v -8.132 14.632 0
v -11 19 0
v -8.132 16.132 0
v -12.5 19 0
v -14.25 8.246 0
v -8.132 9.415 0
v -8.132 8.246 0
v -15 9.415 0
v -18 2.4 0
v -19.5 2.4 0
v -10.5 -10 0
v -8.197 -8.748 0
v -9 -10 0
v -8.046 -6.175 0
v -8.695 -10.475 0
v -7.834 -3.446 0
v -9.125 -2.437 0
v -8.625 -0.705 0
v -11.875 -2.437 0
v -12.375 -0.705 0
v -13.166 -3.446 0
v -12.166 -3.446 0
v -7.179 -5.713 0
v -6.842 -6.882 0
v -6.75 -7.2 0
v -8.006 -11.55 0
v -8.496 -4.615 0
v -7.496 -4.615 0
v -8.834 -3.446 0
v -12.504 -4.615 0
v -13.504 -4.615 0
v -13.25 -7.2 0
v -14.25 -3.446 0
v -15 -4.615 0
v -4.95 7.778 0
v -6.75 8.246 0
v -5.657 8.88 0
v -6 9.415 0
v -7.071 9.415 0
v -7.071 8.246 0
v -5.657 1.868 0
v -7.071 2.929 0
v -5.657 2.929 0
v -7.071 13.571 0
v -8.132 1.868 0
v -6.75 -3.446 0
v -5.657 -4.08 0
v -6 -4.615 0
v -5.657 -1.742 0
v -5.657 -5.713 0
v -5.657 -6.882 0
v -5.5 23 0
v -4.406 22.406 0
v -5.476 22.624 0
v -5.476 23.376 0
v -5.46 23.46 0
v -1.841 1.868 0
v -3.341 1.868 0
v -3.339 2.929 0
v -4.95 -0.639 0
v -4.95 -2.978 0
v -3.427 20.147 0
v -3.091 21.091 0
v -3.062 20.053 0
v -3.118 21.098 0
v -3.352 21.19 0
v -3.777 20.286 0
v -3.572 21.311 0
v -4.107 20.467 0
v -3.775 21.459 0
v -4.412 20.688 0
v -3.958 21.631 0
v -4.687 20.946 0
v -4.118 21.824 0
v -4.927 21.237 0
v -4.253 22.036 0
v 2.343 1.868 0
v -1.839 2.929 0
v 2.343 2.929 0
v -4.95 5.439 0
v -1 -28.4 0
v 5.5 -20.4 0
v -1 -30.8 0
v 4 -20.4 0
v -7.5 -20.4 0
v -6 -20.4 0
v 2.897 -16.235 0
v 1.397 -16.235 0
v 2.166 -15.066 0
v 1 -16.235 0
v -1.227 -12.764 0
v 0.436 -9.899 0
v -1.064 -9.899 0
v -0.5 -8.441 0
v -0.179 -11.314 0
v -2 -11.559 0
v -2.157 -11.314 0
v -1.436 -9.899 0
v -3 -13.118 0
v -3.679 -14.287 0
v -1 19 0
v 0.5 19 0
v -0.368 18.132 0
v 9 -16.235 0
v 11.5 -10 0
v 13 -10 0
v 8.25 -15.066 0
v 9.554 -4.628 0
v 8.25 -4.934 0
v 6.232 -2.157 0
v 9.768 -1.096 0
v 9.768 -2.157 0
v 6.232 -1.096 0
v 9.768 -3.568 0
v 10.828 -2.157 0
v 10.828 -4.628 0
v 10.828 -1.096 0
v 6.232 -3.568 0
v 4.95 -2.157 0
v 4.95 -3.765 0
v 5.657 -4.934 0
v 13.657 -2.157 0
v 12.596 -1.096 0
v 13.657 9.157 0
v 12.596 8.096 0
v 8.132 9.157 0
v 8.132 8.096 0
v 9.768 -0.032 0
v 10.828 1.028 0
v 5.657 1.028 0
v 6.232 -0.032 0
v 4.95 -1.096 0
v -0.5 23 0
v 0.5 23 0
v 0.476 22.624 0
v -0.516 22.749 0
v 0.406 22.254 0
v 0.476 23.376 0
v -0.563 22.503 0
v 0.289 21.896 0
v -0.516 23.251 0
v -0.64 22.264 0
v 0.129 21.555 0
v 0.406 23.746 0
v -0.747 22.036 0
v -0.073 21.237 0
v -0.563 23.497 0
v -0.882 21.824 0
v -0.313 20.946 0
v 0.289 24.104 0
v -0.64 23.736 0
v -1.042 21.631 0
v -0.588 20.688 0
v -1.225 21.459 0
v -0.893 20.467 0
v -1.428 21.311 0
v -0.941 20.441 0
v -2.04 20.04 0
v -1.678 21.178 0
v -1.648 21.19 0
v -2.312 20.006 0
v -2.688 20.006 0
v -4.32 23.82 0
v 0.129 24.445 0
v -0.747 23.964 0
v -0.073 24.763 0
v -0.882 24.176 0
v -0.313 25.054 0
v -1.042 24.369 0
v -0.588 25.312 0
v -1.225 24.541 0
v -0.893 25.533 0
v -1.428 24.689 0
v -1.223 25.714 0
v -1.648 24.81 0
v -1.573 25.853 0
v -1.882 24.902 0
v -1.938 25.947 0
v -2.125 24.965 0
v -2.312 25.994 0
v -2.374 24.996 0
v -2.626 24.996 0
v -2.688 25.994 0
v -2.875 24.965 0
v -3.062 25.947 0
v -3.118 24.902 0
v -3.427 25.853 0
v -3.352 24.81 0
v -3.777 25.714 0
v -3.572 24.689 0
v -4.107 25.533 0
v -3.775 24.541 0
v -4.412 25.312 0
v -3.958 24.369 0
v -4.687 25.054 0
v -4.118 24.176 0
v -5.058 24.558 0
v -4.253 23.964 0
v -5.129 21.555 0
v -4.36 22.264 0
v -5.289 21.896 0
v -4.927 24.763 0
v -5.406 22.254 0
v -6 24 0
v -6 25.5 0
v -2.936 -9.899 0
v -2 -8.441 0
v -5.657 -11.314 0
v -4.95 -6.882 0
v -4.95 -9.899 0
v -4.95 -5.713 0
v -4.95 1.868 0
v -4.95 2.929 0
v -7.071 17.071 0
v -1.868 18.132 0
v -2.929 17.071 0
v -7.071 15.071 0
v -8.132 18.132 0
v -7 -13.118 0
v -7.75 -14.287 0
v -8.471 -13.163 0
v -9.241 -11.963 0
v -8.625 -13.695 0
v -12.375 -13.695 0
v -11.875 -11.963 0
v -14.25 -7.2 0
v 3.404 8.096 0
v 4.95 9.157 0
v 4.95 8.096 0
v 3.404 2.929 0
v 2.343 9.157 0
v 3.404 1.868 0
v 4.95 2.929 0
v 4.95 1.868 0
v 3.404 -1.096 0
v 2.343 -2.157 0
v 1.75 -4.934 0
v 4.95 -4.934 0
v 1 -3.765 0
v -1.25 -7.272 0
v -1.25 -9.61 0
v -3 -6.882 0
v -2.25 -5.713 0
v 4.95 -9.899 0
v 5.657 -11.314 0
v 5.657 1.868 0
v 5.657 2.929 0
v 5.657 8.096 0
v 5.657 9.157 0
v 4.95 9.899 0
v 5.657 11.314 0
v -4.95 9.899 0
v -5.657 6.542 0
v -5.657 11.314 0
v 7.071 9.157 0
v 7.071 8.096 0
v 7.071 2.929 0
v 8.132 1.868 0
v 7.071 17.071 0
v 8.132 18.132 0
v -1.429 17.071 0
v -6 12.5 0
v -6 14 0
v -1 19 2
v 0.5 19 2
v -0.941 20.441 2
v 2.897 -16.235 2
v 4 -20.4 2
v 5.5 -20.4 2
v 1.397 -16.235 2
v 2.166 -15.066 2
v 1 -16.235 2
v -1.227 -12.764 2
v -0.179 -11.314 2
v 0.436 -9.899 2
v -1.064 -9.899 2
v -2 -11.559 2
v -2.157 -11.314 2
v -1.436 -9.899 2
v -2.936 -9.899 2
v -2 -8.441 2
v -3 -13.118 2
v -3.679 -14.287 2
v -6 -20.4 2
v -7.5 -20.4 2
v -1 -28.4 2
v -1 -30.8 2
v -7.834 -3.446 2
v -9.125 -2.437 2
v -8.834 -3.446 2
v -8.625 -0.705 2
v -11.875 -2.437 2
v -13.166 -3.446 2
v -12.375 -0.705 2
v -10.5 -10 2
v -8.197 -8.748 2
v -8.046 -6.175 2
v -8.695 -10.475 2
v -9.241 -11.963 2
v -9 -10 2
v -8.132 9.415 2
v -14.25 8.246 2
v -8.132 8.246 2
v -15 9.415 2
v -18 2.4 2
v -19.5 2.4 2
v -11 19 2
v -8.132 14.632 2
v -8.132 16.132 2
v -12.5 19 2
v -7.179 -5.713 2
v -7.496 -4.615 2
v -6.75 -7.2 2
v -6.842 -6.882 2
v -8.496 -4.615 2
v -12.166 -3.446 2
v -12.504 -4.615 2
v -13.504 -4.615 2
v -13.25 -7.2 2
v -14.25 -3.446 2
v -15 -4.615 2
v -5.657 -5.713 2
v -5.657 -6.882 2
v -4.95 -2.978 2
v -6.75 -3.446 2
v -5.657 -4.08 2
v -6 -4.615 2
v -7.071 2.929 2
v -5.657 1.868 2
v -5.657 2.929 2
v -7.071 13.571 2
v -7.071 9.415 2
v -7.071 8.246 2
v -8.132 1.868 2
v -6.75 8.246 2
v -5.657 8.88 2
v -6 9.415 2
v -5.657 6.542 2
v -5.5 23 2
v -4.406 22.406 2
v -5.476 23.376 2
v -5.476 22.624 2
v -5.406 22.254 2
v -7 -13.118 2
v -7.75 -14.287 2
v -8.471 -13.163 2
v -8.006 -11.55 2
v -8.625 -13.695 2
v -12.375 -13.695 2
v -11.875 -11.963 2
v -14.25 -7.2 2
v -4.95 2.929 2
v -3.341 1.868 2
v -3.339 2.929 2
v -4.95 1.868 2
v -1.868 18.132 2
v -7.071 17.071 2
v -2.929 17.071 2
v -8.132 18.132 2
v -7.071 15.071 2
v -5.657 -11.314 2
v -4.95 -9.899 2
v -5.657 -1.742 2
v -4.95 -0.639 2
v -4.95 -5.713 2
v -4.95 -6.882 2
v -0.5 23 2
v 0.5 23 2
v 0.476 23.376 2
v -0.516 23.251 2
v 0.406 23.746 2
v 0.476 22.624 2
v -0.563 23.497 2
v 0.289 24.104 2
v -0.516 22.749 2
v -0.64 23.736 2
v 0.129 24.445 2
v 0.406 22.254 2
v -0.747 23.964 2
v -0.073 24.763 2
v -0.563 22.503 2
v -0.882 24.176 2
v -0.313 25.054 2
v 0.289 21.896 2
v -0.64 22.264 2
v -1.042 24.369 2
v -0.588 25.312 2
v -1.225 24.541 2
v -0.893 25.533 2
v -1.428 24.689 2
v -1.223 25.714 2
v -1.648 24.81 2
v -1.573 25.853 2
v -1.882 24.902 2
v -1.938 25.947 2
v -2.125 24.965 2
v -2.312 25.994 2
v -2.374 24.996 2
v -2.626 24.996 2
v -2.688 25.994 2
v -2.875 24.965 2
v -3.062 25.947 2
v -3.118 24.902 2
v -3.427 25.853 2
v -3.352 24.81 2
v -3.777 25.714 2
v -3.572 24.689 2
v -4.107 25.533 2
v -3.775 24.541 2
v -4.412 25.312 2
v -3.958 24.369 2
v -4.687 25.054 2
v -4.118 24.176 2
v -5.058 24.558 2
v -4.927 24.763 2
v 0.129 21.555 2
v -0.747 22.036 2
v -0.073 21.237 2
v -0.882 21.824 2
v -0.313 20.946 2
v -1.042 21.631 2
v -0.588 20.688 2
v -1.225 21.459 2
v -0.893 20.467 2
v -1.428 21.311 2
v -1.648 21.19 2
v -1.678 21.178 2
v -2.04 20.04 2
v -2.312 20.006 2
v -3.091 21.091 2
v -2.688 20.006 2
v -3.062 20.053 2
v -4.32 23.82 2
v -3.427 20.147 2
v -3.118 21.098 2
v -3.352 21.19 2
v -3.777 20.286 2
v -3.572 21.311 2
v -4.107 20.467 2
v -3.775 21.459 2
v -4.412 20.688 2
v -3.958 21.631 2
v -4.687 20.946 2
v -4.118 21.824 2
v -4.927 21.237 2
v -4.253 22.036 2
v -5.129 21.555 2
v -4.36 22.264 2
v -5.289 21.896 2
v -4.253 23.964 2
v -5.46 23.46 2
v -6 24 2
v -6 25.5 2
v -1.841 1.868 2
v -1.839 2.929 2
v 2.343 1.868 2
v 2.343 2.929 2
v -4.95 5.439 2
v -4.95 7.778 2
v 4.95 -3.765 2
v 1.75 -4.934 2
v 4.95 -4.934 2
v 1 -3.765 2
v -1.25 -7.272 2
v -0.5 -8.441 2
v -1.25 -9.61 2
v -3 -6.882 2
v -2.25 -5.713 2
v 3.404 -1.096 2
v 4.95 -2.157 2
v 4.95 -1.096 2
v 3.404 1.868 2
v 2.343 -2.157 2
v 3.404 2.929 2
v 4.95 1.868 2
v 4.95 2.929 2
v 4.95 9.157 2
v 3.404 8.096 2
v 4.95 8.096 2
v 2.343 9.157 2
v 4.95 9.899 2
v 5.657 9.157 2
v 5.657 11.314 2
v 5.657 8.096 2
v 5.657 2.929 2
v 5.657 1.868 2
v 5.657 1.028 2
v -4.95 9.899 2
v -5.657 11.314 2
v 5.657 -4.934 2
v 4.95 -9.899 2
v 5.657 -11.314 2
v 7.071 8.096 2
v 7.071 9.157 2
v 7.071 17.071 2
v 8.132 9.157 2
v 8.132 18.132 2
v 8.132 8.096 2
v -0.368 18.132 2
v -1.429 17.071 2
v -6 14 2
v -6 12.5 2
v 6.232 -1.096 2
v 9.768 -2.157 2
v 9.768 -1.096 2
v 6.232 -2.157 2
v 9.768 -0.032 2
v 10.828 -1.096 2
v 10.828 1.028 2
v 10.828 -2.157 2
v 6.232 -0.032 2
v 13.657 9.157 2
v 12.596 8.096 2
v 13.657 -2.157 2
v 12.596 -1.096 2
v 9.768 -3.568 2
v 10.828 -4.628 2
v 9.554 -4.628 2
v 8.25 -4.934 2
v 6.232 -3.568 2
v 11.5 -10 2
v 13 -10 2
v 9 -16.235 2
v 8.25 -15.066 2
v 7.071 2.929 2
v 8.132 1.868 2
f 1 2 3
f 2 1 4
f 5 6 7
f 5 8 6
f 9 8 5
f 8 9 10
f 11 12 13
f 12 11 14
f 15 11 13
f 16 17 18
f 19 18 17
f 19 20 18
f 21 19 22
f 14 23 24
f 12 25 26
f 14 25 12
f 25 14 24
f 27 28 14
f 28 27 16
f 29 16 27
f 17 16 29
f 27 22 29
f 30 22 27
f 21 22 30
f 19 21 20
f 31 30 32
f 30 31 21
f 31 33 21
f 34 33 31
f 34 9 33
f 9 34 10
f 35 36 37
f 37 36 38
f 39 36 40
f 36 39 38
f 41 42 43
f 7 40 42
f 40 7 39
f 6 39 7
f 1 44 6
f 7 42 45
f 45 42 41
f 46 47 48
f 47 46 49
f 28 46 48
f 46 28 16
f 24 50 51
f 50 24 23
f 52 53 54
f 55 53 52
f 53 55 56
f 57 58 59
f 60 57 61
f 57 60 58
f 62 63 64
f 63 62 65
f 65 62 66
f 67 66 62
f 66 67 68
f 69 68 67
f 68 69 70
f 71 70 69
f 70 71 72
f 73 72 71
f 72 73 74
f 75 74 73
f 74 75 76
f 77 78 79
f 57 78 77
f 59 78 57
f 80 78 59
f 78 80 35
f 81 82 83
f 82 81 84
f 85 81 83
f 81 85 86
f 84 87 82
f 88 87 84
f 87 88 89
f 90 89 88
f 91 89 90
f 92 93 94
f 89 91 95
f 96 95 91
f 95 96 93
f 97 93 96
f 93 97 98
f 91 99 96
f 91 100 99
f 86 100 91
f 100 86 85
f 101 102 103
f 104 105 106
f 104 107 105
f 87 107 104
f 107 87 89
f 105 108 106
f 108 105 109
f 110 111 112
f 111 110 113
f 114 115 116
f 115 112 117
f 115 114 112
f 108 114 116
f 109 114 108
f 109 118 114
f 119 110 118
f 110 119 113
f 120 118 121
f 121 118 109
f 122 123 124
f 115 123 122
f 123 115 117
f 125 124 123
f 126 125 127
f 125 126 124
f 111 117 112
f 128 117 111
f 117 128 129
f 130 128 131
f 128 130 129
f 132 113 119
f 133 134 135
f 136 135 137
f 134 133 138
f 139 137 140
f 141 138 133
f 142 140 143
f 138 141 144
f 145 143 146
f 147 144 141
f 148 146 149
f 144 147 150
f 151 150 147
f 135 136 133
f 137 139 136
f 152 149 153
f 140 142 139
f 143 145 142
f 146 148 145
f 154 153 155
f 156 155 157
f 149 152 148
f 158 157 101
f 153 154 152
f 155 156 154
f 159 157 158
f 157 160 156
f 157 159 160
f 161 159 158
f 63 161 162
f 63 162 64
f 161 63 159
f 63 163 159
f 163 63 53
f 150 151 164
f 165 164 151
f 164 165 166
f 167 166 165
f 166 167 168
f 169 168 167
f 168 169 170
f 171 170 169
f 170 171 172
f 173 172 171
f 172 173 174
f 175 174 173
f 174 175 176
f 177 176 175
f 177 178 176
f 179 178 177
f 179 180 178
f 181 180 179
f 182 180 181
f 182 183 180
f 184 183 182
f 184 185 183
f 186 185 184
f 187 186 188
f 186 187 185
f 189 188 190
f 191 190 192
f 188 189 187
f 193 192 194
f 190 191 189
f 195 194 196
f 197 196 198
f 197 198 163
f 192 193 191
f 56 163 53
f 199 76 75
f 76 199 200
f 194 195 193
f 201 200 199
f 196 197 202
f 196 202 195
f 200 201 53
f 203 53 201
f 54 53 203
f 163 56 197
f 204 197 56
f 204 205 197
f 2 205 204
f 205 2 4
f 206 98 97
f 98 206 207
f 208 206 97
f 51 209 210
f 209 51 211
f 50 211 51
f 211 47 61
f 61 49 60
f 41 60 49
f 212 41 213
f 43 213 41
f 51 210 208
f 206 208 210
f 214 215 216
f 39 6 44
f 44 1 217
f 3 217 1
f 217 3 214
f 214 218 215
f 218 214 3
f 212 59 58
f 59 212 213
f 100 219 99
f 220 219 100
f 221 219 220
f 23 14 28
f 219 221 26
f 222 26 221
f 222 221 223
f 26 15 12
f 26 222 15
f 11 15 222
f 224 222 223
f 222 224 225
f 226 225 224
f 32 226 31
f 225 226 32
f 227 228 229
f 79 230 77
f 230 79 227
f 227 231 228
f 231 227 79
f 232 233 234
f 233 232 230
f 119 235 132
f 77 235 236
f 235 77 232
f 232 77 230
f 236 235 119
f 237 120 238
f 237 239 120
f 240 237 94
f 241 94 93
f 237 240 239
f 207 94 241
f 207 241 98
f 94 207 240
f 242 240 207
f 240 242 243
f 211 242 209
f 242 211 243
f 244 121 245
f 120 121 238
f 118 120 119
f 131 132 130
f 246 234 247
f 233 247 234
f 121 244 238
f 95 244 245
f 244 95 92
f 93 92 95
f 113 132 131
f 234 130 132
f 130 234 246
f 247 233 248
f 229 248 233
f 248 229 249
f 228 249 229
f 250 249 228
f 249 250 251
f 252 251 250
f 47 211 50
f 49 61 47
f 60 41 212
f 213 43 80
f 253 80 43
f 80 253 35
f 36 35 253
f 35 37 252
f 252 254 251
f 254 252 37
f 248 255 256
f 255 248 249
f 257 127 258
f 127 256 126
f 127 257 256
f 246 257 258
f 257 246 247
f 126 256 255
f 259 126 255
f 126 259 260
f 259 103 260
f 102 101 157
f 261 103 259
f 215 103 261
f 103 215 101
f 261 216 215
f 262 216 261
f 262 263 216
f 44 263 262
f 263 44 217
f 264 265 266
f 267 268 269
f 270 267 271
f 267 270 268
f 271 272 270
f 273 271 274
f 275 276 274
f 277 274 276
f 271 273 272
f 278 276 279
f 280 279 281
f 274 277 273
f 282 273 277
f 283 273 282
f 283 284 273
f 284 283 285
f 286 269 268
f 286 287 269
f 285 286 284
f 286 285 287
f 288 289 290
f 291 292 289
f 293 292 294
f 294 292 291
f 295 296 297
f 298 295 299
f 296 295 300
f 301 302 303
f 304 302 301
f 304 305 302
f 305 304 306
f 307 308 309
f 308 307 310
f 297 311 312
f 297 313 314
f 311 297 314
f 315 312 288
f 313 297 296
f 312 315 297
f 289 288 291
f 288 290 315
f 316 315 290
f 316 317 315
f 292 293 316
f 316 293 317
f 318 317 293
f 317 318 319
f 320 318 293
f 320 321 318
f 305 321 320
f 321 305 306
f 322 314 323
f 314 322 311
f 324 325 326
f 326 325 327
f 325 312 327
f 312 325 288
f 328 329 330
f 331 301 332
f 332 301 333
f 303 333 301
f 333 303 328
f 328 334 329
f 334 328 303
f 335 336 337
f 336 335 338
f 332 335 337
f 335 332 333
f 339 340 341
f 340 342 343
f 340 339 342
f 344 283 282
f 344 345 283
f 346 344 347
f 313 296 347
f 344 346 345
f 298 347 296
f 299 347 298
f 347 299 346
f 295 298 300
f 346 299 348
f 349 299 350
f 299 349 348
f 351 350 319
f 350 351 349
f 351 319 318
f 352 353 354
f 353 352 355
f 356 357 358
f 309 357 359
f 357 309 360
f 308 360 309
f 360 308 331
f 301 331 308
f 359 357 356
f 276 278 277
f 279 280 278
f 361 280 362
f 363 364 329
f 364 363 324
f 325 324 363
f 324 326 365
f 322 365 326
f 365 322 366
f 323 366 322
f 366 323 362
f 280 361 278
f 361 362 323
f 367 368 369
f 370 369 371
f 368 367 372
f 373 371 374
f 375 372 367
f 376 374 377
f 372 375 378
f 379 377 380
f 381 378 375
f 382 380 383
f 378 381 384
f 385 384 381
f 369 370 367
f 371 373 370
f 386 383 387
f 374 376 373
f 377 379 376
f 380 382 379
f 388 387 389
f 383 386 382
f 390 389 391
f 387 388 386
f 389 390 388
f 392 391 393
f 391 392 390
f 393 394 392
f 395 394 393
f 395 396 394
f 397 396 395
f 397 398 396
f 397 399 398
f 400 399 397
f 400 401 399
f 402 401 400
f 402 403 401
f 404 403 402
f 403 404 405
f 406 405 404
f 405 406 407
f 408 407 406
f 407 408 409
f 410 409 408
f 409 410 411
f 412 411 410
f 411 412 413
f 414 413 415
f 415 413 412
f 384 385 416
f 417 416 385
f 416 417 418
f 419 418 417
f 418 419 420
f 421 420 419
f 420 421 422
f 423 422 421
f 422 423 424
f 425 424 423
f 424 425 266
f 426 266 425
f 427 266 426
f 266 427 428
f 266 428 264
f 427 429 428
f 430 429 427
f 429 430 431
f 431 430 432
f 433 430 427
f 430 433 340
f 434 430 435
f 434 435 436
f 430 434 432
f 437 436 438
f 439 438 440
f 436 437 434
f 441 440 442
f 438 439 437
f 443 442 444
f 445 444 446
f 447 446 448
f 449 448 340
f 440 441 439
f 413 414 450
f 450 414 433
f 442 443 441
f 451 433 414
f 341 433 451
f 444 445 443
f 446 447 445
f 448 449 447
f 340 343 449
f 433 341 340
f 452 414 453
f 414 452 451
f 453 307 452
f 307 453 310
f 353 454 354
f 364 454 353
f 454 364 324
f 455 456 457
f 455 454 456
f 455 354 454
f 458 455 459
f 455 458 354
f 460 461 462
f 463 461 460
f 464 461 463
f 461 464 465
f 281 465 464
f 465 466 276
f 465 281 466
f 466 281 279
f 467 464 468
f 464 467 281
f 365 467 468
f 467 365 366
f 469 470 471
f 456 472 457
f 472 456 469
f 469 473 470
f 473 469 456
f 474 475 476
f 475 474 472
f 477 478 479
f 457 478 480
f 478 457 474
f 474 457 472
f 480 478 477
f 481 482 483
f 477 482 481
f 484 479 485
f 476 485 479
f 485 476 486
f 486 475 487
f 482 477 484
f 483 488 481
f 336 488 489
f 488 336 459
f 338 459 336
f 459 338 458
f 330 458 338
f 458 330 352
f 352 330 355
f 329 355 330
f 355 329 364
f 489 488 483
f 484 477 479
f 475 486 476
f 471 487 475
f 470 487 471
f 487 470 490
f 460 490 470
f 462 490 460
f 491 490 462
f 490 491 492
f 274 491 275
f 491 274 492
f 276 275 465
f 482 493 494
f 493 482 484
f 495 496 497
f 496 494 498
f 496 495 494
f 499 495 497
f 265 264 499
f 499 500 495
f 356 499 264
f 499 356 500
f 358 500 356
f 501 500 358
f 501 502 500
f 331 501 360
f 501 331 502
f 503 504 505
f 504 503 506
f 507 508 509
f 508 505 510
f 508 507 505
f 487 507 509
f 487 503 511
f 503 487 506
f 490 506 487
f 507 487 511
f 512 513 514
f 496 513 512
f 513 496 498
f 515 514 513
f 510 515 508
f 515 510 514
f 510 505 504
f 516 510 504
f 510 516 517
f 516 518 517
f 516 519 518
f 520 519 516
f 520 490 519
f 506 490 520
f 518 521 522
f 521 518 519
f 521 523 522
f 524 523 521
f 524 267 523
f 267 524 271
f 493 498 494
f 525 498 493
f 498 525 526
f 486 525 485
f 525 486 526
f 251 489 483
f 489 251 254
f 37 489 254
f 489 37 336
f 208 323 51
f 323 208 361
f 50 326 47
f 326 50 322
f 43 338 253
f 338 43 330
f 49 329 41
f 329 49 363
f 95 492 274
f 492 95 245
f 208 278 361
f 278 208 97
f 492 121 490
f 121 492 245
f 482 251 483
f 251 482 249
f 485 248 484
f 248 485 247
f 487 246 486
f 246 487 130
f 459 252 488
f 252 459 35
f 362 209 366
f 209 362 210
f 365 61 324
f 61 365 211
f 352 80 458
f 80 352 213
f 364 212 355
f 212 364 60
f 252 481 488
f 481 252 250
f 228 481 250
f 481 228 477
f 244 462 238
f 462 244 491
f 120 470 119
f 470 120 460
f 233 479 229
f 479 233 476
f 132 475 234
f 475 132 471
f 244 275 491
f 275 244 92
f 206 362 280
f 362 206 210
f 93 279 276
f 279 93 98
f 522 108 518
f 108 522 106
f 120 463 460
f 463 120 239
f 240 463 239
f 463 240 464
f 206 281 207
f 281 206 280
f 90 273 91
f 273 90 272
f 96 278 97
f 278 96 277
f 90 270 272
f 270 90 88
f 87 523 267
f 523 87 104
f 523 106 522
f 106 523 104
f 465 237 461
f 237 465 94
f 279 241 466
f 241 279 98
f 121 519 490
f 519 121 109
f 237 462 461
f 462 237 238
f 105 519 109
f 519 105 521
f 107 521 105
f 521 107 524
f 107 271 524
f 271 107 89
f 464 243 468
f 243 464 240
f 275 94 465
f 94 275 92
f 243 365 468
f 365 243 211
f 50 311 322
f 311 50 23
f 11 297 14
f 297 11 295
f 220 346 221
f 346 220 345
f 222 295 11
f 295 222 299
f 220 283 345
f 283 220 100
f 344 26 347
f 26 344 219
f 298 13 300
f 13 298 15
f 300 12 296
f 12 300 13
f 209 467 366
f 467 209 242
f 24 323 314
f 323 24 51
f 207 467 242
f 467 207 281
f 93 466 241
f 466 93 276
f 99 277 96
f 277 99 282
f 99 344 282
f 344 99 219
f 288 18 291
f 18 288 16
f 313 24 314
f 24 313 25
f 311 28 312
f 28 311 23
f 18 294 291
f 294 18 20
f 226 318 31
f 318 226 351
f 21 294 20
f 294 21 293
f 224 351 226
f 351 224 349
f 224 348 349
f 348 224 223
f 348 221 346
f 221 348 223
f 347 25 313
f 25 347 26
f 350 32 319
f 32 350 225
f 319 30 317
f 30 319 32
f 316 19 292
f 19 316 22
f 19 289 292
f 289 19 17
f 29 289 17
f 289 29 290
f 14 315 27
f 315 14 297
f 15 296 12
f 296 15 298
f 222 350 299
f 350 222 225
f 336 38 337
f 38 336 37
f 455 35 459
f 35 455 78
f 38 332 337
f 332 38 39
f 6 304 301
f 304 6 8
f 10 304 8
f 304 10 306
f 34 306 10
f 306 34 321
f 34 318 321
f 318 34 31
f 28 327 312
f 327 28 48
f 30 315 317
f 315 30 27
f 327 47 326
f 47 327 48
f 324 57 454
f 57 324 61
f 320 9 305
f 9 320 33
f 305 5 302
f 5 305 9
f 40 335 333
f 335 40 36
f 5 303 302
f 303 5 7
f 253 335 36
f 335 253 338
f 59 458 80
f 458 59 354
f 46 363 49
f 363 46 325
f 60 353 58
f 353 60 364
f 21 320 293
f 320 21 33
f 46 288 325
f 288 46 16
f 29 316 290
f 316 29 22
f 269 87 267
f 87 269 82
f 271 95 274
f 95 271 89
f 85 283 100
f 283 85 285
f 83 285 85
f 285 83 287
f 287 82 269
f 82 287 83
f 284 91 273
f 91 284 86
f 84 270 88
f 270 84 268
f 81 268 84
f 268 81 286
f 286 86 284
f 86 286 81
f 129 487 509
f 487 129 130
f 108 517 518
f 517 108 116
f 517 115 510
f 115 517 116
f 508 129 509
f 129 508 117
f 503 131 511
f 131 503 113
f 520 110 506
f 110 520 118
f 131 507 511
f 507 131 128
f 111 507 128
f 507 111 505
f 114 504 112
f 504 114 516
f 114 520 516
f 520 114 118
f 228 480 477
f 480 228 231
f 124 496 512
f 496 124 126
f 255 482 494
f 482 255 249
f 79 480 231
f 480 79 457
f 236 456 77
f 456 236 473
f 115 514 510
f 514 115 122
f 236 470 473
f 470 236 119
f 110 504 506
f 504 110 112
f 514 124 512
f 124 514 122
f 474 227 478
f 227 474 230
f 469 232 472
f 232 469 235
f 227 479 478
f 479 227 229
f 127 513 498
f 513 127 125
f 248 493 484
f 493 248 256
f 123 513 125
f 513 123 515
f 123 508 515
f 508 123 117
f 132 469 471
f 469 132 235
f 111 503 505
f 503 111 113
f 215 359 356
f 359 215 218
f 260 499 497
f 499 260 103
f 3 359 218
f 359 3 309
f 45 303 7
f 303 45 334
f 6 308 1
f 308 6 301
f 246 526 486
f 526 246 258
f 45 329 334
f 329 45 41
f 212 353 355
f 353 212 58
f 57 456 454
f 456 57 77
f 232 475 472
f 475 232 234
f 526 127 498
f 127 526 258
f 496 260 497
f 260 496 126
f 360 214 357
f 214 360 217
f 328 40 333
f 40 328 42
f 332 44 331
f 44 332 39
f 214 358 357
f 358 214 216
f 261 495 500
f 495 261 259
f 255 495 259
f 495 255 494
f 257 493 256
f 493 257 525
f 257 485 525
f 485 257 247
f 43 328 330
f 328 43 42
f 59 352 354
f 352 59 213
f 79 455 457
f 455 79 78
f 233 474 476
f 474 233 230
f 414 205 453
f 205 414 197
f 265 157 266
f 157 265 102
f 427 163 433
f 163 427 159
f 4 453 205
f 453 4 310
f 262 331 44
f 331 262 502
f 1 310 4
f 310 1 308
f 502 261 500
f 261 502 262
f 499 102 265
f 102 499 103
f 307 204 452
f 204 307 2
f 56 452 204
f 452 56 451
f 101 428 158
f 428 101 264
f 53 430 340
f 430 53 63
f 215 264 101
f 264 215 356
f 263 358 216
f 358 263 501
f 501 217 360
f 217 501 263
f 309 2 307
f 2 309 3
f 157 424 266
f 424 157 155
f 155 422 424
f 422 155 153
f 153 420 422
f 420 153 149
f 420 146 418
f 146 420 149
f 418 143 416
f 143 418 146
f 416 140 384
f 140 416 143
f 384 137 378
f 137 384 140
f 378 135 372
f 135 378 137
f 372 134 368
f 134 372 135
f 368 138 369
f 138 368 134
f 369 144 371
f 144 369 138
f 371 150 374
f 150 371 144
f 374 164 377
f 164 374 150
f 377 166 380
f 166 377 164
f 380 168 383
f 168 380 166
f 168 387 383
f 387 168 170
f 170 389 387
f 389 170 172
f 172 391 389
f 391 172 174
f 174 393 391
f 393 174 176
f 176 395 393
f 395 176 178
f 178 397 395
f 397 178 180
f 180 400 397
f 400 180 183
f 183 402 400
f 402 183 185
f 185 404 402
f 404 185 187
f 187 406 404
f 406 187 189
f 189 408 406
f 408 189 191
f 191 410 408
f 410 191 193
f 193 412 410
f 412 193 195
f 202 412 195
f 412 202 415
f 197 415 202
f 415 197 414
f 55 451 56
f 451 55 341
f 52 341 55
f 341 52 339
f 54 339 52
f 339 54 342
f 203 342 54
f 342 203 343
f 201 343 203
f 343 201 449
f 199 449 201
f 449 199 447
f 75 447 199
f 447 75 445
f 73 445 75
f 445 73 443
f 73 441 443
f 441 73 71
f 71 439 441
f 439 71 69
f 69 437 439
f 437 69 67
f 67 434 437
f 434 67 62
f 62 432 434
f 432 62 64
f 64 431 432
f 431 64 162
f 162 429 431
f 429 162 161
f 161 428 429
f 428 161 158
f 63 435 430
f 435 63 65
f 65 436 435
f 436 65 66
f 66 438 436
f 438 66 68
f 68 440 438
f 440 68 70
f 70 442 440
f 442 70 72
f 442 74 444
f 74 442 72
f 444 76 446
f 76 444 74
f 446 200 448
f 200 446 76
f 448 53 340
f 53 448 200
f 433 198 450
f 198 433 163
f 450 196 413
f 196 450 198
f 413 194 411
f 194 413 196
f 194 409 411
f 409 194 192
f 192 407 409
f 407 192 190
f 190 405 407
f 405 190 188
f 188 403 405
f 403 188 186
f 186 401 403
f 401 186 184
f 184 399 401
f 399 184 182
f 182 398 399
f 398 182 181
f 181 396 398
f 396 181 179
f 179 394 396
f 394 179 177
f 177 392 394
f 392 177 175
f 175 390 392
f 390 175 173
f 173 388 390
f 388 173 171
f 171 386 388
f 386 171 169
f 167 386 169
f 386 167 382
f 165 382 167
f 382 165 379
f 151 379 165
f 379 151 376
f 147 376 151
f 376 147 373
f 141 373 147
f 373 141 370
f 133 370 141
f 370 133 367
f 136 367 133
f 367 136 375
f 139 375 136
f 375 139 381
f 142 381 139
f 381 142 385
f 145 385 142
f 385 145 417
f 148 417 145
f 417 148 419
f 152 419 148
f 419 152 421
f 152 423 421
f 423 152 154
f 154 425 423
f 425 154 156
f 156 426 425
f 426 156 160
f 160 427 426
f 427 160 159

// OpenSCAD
$fn=50;

module x_scale(size) {
    scale([size,1,1])
        children();
}

module y_scale(size) {
    scale([1,size,1])
        children();
}

module make_shape(d,ln_width,fn,thickness=2) {
    linear_extrude(thickness)
        difference() {
            circle(d=d,$fn=fn);
            circle(d=d-ln_width,$fn=fn);
        }
}

//biggest oblong rectangle
y_scale(2) rotate([0,0,45])
    make_shape(16,2,4);

//big middle hexagon
translate([5,-10,0]) y_scale(.9)
    make_shape(16,3,6);

//small middle hexagon
translate([-5,-10,0]) y_scale(.9)
    make_shape(11,3,6);

//left tall hexagon
translate([-10.5,-7.2,0])y_scale(2)
    make_shape(7.5,2,6);

//top left hexagon
translate([-10.5,2.4,0])y_scale(.9)
    make_shape(18,3,6);

//bottom diamond
translate([-1,-20.4,0])
    y_scale(1.6)
        make_shape(13,3,4);

//small square
translate([8,-1.8,0])
    rotate([0,0,45])
        make_shape(8,3,4);

//big right square
translate([8,3.5,0])
    rotate([0,0,45])
        make_shape(16,3,4);

//big top square
translate([0,10,0])
    rotate([0,0,45])
        make_shape(23,3,4);

//small top diamond
translate([-6,19,0])
    make_shape(13,3,4);

//small circle
translate([-2.5,23,0])
    linear_extrude(2)
        difference() {
            circle(d=6);
            circle(d=4);

        }
